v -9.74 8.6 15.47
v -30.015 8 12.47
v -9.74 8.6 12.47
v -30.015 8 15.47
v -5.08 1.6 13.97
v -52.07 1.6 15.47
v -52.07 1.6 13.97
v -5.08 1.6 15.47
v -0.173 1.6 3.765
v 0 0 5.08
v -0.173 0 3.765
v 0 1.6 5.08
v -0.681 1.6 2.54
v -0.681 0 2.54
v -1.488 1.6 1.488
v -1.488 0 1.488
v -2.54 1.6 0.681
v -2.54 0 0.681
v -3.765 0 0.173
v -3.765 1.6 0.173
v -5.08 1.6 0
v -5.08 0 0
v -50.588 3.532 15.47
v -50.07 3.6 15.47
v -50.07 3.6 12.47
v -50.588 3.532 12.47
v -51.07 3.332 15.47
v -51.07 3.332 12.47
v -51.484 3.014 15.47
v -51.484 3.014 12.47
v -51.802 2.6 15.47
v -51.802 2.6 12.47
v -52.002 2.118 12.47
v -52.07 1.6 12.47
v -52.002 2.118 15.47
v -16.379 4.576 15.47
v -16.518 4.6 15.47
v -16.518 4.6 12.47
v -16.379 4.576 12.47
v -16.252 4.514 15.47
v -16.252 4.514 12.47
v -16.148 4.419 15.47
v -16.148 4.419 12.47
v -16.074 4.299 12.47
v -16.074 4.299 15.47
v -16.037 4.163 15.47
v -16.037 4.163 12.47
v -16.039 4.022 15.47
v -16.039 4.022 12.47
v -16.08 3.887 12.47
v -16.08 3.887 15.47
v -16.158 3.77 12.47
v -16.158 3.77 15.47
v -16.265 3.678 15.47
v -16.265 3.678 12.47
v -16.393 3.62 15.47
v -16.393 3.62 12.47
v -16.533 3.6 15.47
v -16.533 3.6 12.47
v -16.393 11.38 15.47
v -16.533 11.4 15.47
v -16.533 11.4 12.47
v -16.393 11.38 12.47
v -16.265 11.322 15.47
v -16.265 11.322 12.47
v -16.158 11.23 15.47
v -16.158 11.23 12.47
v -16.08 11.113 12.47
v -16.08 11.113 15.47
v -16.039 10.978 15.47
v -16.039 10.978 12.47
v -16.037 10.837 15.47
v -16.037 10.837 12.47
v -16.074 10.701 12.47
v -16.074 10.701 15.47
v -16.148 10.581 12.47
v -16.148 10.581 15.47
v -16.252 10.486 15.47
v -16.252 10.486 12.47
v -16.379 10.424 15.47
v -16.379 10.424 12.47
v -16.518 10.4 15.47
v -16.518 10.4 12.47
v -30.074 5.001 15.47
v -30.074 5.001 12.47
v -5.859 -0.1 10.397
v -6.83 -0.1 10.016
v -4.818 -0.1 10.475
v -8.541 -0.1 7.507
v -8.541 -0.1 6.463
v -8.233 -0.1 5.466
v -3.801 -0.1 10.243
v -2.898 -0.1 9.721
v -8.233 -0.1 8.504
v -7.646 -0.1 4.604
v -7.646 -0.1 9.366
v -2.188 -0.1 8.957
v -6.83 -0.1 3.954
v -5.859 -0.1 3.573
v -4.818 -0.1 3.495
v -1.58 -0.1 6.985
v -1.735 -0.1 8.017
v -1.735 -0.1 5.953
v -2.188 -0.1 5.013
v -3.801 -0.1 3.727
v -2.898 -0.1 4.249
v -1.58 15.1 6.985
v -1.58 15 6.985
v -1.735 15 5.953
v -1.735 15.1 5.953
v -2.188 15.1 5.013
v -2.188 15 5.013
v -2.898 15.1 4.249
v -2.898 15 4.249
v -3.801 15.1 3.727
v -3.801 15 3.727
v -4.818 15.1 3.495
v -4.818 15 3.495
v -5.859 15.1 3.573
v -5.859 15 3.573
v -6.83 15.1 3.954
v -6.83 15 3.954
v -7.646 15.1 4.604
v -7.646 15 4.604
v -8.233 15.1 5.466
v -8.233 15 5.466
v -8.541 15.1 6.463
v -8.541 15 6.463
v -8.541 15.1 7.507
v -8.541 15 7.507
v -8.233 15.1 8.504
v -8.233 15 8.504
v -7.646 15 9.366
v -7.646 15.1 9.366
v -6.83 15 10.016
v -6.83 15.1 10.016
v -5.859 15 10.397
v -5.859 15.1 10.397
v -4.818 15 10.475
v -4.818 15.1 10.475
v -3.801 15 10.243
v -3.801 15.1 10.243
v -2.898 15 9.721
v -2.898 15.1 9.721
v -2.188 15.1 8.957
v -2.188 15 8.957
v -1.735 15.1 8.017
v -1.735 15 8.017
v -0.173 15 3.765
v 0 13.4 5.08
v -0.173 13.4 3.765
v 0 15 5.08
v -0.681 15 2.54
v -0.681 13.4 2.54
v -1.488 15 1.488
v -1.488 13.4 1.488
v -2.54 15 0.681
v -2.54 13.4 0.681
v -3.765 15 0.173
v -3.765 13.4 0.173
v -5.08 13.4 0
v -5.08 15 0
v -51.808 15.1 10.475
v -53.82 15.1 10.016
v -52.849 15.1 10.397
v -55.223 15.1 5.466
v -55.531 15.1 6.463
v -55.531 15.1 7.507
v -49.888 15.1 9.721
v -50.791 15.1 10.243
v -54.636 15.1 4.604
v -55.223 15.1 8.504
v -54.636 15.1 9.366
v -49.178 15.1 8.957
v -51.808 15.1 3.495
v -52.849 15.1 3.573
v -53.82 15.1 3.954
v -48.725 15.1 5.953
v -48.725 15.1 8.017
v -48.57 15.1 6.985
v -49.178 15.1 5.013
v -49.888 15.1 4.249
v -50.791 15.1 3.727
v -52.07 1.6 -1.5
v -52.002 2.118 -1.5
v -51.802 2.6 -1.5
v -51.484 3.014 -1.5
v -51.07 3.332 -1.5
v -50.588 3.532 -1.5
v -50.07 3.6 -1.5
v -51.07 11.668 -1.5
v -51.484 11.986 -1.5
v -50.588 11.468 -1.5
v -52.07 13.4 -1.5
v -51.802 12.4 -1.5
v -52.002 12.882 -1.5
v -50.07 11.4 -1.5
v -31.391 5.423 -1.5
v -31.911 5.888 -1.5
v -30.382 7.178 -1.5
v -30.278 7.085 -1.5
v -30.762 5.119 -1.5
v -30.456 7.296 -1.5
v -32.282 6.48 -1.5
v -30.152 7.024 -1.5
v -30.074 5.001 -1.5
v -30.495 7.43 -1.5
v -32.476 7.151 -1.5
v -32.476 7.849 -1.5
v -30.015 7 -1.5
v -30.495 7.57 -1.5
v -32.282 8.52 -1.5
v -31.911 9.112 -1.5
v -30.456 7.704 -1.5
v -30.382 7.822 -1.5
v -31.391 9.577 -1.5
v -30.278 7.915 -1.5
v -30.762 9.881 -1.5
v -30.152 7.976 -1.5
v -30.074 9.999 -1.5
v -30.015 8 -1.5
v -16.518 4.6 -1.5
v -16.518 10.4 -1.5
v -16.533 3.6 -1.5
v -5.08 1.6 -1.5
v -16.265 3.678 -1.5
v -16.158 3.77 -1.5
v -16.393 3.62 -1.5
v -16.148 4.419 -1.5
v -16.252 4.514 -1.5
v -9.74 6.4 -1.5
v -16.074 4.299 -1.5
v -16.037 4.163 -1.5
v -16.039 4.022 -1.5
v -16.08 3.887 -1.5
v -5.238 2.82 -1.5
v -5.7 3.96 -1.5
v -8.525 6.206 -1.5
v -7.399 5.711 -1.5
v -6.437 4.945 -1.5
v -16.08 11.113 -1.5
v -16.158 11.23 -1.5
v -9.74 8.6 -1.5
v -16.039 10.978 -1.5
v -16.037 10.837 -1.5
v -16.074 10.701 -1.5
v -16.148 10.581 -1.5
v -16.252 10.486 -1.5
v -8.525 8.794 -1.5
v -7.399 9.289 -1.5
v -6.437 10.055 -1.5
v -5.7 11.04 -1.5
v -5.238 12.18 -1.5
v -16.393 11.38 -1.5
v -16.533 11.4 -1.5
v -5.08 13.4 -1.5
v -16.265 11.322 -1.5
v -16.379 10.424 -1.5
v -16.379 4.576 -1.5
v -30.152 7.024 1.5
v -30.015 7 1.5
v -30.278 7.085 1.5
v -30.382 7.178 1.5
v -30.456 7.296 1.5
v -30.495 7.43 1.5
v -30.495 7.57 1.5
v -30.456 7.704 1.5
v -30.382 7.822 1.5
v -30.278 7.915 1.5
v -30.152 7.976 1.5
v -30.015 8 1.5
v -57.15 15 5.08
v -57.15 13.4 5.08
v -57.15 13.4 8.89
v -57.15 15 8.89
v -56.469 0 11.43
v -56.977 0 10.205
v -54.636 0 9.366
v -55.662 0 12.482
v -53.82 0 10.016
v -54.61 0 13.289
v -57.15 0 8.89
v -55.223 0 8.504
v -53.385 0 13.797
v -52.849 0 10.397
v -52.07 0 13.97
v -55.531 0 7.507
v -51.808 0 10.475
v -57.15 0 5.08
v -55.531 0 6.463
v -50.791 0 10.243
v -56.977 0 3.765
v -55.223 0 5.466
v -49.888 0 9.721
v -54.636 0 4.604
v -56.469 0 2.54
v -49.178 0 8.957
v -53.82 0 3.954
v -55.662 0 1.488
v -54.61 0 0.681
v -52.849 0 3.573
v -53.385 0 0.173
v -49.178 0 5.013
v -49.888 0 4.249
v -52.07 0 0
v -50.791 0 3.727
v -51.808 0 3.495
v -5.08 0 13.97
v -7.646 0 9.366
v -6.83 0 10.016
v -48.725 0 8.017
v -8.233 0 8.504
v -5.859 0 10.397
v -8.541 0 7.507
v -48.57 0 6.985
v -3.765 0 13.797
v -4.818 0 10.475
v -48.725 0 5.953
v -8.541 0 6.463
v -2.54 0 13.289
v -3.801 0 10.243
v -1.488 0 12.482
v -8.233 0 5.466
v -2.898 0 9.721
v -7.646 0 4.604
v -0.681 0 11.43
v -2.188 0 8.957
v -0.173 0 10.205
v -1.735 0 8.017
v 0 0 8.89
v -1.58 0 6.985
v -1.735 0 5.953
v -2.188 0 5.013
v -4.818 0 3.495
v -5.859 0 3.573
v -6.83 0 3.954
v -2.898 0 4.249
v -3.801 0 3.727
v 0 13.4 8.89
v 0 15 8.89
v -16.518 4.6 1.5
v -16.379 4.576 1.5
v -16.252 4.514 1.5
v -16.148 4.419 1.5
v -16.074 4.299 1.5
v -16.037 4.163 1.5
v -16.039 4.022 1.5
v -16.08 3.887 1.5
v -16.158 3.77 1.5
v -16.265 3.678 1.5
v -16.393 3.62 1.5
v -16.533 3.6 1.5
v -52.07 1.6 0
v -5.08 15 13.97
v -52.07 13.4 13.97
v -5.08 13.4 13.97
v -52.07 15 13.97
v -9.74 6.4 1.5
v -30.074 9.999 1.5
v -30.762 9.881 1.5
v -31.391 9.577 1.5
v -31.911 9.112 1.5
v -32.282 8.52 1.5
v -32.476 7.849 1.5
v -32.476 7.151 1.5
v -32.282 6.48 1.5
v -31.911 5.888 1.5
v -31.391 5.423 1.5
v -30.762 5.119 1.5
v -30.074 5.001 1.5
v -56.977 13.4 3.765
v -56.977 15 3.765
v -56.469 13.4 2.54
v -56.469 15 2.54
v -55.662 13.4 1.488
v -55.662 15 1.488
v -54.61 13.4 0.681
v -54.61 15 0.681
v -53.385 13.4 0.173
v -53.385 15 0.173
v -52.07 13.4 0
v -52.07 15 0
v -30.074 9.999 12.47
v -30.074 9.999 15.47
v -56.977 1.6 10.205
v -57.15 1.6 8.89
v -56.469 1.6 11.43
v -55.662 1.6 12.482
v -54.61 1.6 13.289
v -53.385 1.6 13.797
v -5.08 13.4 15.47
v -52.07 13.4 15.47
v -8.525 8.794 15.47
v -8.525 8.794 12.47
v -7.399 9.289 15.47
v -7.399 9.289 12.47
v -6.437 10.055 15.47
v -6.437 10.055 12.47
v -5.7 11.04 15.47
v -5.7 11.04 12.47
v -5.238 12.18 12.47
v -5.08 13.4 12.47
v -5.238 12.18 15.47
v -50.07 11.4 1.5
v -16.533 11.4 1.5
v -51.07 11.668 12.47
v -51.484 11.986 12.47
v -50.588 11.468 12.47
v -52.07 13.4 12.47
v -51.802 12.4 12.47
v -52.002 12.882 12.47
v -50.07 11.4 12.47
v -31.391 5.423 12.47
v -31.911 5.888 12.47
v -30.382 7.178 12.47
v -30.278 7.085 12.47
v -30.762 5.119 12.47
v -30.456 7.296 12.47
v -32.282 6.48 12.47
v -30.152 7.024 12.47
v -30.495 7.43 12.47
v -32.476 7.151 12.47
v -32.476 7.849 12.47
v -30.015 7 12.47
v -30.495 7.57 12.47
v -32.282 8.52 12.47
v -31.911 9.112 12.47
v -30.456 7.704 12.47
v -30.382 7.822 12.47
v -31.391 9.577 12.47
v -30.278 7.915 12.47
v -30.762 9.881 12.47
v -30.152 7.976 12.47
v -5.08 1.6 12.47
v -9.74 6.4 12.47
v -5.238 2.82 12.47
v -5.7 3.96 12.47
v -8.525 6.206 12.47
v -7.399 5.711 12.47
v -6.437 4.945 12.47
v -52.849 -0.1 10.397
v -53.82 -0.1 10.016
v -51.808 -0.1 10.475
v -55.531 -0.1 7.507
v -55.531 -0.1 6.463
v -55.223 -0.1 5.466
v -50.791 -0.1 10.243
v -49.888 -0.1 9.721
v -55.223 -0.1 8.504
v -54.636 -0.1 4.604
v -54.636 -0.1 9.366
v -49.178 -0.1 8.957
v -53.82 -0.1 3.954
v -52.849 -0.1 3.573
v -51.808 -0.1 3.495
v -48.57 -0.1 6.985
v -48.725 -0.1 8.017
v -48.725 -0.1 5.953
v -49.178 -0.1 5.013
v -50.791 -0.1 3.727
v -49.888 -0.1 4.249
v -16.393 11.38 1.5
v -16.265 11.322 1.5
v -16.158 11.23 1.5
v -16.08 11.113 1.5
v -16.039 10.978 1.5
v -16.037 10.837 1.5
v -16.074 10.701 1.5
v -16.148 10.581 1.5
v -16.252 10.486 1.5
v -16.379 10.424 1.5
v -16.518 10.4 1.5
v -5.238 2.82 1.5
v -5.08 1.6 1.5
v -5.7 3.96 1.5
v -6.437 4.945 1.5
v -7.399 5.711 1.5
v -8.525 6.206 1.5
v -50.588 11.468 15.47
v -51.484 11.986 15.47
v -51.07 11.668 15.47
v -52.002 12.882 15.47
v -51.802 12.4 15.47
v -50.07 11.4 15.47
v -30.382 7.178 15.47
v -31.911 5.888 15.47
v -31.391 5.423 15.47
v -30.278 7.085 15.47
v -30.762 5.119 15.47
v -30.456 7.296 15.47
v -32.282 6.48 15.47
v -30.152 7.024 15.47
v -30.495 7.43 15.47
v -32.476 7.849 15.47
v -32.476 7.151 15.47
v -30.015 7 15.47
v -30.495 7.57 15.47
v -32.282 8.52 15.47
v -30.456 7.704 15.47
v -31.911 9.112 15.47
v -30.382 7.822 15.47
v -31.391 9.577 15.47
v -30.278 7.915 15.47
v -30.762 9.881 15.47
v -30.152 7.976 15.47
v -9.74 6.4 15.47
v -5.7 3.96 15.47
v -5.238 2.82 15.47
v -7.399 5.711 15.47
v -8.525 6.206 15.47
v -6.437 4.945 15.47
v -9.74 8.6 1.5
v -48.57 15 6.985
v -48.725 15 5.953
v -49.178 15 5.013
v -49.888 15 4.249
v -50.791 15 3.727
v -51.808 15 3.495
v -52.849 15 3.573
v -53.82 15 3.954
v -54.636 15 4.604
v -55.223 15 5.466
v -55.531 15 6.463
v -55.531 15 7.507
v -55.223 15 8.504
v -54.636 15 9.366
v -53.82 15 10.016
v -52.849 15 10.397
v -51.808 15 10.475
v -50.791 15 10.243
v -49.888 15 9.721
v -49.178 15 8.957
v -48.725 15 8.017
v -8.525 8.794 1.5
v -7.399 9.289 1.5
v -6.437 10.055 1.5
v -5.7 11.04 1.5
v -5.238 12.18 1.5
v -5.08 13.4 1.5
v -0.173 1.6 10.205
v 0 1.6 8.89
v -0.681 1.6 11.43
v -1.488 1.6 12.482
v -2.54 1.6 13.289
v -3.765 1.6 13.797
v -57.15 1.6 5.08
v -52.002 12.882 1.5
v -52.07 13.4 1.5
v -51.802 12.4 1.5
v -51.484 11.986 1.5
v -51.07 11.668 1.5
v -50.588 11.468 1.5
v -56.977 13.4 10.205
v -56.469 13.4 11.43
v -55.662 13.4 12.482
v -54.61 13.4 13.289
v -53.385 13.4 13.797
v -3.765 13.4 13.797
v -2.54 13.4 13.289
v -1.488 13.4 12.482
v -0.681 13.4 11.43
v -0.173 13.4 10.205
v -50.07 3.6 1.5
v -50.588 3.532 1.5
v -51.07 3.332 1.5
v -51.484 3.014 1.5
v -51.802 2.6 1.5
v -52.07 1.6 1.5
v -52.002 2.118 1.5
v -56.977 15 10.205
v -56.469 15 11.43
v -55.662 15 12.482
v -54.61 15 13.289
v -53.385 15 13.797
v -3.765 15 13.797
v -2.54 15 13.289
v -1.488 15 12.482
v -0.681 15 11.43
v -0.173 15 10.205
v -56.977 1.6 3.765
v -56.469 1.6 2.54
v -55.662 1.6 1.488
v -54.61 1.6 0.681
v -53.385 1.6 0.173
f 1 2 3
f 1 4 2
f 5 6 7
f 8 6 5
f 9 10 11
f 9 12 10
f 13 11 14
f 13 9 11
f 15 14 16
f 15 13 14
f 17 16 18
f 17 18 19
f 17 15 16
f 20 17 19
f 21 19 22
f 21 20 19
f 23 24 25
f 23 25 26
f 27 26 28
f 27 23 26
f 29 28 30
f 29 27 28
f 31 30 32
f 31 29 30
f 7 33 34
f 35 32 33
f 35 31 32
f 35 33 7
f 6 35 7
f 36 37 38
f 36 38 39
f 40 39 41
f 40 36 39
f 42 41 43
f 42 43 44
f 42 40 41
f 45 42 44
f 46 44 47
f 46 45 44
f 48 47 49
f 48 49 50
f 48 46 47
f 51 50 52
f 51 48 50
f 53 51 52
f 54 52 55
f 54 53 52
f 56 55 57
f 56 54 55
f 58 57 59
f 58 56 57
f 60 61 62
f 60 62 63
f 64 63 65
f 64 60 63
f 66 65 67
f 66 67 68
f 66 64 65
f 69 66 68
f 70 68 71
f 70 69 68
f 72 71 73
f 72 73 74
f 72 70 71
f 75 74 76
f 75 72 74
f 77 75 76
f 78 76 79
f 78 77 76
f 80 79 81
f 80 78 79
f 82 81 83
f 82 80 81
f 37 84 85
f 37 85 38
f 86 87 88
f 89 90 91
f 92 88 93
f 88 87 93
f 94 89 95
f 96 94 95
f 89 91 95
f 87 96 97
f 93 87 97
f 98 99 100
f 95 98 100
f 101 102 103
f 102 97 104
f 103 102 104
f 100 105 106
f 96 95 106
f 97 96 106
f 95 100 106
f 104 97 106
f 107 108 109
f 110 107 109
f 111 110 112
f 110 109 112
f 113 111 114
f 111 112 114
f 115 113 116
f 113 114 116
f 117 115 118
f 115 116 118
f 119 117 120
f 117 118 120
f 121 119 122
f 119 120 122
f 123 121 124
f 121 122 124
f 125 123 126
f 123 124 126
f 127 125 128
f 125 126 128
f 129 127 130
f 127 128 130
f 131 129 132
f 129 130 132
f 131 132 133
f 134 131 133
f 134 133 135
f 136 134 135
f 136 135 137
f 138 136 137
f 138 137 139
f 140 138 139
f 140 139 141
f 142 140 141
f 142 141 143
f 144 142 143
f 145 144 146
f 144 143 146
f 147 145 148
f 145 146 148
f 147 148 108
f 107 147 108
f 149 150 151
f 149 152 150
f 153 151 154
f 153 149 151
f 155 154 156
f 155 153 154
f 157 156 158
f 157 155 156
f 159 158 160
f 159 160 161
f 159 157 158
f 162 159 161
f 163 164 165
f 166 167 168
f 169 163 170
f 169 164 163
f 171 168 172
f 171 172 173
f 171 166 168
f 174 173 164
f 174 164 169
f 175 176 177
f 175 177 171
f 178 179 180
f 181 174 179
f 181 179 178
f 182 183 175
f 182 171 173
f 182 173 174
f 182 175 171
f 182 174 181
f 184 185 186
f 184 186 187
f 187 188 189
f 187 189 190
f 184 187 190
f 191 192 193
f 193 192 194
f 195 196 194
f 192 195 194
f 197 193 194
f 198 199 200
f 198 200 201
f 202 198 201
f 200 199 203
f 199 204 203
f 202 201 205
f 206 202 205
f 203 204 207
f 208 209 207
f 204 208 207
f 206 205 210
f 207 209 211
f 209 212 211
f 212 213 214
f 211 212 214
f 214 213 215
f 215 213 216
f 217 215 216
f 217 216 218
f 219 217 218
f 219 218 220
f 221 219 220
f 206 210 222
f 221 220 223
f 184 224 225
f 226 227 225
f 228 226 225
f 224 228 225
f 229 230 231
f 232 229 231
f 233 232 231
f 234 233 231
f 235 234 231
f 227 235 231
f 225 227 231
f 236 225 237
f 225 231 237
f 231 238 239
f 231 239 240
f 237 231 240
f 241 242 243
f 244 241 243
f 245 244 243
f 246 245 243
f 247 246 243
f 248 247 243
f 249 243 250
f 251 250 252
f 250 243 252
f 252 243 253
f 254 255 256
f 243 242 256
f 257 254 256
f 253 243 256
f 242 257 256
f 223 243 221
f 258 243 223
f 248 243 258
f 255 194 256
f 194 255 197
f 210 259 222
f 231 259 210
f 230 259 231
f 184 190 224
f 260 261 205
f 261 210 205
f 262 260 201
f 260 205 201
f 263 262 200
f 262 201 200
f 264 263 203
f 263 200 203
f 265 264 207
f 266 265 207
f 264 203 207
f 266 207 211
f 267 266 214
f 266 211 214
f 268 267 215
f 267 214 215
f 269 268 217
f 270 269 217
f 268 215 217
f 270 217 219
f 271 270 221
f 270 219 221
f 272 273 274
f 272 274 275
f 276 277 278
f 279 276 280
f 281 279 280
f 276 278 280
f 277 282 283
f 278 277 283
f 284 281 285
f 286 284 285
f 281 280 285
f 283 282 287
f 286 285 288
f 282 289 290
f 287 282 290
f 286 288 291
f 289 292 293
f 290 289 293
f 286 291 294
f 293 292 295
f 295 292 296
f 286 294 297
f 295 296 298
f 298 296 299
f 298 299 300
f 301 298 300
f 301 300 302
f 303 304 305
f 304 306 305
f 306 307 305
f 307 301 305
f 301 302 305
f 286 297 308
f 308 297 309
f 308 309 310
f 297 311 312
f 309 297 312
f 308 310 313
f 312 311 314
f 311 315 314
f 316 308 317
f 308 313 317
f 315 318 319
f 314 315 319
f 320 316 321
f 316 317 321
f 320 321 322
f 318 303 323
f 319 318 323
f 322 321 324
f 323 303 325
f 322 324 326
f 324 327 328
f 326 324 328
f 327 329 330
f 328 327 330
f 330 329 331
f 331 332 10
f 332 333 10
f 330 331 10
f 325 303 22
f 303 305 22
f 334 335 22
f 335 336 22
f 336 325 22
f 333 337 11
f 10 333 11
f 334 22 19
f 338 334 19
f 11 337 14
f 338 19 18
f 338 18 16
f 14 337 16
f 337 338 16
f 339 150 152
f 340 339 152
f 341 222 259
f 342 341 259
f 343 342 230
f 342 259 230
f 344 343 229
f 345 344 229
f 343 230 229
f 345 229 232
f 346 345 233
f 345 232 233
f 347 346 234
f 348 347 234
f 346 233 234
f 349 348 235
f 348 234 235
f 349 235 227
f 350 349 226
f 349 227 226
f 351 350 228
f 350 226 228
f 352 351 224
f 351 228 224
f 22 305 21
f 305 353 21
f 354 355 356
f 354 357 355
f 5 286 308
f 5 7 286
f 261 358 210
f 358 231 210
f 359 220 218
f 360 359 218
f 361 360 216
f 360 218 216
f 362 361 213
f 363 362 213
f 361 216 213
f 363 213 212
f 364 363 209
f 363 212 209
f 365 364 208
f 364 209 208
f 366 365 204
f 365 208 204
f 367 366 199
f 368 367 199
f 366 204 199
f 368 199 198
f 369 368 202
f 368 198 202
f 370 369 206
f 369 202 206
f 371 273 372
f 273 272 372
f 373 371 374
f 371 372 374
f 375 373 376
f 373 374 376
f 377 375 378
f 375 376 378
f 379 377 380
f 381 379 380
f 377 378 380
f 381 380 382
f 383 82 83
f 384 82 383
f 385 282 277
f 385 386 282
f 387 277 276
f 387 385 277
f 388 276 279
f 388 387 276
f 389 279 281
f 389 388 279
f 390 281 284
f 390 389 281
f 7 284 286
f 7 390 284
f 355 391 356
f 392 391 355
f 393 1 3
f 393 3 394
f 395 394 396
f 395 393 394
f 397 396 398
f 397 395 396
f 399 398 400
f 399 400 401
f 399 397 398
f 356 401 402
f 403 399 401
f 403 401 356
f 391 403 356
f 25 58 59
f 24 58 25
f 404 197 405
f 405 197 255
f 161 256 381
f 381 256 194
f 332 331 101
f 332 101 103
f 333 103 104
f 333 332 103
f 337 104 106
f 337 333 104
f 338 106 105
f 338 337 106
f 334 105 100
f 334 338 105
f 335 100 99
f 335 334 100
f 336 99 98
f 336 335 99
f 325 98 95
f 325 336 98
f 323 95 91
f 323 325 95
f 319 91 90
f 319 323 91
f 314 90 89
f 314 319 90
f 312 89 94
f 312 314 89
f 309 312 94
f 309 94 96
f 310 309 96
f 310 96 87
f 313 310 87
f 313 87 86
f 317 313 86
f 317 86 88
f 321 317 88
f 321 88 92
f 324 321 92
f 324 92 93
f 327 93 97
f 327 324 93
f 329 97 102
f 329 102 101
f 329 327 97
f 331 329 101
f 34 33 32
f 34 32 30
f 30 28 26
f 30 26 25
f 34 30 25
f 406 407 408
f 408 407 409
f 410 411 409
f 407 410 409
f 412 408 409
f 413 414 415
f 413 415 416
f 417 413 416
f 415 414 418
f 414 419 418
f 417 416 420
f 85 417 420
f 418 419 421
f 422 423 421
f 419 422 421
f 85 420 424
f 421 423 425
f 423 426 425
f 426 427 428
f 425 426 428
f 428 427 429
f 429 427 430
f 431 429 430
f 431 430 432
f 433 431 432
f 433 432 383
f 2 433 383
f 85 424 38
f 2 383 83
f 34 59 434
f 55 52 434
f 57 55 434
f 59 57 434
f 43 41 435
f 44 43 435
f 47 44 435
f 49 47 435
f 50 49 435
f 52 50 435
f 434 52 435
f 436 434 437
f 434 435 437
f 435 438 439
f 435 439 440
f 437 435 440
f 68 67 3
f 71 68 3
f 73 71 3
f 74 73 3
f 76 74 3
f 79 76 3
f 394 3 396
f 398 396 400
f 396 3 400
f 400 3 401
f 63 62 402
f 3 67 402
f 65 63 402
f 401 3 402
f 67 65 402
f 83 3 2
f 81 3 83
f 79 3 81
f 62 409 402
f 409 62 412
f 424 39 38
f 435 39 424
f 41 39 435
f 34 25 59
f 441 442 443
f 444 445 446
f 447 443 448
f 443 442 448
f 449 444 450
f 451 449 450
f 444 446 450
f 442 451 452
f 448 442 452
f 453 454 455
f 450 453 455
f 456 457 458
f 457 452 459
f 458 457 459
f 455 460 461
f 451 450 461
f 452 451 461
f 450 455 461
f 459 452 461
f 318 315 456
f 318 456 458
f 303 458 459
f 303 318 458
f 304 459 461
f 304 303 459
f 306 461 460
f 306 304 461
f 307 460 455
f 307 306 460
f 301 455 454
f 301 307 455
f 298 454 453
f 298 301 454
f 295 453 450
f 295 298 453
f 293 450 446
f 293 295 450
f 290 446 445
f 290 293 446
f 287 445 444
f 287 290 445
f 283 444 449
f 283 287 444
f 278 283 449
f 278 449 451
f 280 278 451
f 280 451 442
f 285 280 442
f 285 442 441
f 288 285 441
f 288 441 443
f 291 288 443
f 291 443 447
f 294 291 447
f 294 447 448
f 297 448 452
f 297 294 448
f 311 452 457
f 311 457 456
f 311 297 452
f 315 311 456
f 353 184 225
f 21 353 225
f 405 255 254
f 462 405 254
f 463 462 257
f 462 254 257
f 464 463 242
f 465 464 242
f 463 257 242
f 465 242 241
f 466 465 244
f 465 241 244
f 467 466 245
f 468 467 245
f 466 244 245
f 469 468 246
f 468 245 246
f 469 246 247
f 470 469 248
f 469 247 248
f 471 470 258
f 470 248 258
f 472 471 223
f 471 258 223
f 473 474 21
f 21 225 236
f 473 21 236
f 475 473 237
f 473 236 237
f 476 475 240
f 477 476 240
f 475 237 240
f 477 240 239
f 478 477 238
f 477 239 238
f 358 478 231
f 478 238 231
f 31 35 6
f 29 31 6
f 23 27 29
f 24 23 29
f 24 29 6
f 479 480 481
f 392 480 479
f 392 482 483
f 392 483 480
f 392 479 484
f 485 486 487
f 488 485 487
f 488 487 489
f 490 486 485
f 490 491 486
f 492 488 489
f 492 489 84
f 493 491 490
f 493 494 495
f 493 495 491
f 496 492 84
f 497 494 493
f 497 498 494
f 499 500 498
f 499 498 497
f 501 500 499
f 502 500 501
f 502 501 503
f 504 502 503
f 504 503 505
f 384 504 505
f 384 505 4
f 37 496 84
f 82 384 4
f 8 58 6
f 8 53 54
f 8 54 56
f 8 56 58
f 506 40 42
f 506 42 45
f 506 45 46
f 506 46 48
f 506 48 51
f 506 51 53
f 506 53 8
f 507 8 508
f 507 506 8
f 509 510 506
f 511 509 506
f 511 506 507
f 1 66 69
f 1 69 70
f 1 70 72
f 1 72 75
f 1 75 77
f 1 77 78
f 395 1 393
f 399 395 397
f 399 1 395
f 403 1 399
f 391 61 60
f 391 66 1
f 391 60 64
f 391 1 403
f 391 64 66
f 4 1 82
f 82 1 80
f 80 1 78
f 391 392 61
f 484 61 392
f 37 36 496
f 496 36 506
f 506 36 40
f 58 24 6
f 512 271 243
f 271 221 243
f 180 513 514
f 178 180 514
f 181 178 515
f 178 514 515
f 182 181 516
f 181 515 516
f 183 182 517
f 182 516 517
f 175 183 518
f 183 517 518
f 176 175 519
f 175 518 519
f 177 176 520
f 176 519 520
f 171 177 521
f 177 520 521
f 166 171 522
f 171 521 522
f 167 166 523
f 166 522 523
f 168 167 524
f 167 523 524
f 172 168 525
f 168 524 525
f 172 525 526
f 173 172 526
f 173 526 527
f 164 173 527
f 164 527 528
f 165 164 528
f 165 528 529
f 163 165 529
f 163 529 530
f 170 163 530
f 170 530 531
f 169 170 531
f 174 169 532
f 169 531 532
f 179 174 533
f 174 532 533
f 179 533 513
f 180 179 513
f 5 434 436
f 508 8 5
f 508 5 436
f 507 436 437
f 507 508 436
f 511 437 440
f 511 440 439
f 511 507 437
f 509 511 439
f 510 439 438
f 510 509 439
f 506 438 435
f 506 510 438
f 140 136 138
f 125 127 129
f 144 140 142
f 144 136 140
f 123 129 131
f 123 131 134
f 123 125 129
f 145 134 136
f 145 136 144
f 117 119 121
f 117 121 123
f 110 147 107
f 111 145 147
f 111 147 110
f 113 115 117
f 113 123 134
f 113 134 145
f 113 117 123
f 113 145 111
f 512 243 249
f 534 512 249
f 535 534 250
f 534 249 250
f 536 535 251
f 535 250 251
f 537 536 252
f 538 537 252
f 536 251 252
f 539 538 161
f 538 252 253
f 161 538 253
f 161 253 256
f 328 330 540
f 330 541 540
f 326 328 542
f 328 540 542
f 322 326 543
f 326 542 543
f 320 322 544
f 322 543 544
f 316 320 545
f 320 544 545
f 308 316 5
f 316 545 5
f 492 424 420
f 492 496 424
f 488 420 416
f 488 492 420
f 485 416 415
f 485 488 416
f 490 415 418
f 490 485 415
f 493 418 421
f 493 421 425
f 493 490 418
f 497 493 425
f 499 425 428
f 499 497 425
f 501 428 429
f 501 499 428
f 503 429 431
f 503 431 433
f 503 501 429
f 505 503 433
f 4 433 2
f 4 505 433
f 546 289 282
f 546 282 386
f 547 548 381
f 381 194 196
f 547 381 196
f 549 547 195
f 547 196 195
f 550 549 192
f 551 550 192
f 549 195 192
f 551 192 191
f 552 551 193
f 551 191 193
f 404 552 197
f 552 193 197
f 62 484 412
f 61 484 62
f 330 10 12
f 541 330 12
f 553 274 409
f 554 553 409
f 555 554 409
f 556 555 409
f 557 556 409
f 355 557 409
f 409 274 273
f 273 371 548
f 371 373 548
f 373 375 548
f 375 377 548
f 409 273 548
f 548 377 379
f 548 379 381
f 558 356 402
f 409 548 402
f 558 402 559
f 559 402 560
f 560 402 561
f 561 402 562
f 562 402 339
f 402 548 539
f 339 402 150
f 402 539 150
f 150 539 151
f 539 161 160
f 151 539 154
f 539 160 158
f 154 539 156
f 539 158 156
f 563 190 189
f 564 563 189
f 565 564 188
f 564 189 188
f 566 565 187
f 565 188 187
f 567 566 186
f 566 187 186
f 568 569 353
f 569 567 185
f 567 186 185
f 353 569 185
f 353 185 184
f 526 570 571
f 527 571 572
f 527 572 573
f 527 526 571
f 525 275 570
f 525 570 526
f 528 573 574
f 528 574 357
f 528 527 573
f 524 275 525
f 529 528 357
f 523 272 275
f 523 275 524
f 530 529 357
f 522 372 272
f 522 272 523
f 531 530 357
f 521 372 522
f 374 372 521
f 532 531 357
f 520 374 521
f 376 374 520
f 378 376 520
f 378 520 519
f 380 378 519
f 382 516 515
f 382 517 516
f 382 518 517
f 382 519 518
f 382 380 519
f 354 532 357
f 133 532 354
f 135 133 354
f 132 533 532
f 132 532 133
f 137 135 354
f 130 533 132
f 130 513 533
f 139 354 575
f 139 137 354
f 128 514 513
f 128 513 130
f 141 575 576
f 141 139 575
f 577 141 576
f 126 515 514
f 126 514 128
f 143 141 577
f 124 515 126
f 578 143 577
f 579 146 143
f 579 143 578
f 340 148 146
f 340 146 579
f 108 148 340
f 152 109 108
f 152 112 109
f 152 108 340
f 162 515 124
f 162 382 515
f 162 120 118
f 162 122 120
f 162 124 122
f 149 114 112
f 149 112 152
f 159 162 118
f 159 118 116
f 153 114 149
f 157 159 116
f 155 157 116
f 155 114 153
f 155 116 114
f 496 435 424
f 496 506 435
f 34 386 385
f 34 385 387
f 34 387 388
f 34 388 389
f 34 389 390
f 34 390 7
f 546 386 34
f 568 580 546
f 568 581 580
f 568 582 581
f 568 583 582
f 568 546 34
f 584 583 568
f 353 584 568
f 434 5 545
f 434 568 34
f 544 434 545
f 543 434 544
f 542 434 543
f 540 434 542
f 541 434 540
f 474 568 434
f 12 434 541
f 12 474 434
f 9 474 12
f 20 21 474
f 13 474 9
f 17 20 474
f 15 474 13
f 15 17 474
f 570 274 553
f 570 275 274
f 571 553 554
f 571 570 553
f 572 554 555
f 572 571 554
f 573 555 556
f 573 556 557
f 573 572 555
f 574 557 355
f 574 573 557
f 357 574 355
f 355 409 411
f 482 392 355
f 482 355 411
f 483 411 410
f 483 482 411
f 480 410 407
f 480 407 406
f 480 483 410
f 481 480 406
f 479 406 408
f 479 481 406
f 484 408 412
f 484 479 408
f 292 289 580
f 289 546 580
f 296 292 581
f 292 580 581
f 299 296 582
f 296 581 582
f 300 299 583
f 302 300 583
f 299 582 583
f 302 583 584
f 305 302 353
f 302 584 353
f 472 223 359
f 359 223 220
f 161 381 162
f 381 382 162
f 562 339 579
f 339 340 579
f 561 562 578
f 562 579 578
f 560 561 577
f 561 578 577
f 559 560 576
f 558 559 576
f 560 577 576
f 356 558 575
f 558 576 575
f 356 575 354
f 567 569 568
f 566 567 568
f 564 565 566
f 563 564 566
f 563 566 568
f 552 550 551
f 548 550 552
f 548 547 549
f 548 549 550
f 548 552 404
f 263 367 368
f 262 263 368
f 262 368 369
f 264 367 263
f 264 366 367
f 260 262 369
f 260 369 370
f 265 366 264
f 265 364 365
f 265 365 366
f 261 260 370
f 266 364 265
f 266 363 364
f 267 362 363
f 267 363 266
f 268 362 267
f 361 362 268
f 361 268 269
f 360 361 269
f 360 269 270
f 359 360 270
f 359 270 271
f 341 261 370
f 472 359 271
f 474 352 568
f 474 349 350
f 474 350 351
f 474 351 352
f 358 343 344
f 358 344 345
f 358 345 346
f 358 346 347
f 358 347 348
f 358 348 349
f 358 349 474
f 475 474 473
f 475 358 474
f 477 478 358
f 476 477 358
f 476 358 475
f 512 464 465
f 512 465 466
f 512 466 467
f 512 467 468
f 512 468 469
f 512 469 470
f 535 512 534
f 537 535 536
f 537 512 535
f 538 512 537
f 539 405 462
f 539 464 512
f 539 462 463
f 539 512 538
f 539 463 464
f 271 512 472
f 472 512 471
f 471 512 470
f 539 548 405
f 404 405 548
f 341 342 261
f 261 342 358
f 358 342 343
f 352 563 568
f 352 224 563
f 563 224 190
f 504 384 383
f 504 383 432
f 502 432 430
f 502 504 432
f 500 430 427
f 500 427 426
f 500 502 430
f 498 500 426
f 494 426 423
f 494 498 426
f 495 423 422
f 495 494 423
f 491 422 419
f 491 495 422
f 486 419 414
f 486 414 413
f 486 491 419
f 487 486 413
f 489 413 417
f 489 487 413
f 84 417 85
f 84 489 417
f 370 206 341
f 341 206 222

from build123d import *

# Parameters (mm, degrees)
SKETCH1_W             = 57.15
SKETCH1_H             = 1.6
BOSS_EXTRUDE1_DEPTH   = 13.97
BOSS_EXTRUDE1_2_DEPTH = 13.97
FILLET1_R             = 5.08
FILLET2_R             = 5.08
BOSS_EXTRUDE3_DEPTH   = 1.5
SKETCH3_R             = 3.5
BOSS_EXTRUDE4_DEPTH   = 0.1


with BuildPart() as part:
    # Sketch1 → Boss-Extrude1 (new body)
    with BuildSketch(Plane.XY):
        with Locations((-28.575, 0.8)):
            Rectangle(SKETCH1_W, SKETCH1_H)
    extrude(amount=BOSS_EXTRUDE1_DEPTH)

    # Fillet2
    fillet2_edges = [part.edges().sort_by_distance(p)[0] for p in [
        (-57.15, 0.8, 13.97),
        (0, 0.8, 13.97),
        (-57.15, 0.8, 0),
        (0, 0.8, 0),
    ]]
    fillet(fillet2_edges, radius=FILLET2_R)



with BuildPart() as body_2:
    # Sketch1 → Boss-Extrude1 2 (new body)
    with BuildSketch(Plane.XY):
        with Locations((-28.575, 14.2)):
            Rectangle(SKETCH1_W, SKETCH1_H)
    extrude(amount=BOSS_EXTRUDE1_2_DEPTH)

    # Fillet1
    fillet1_edges = [body_2.edges().sort_by_distance(p)[0] for p in [
        (-57.15, 14.2, 13.97),
        (0, 14.2, 13.97),
        (-57.15, 14.2, 0),
        (0, 14.2, 0),
    ]]
    fillet(fillet1_edges, radius=FILLET1_R)


with BuildPart() as part_1:
    add(part.part)

    add(body_2.part)  # Boss-Extrude3 merges body 2
    # Sketch2 → Boss-Extrude3 (add, symmetric)
    with BuildSketch(Plane.XY.offset(13.97)):
        with BuildLine():
            Line((-30.014795616, 7.999781042), (-9.740002775, 8.6))
            ThreePointArc((-9.740002775, 8.6), (-6.43662966, 10.055017718), (-5.08, 13.4))
            Line((-5.08, 13.4), (-52.07, 13.4))
            ThreePointArc((-52.07, 13.4), (-51.484213562, 11.985786438), (-50.07, 11.4))
            Line((-50.07, 11.4), (-16.532798801, 11.4))
            ThreePointArc((-16.532798801, 11.4), (-16.032853544, 10.907398618), (-16.518003185, 10.400218958))
            Line((-16.518003185, 10.400218958), (-30.073978082, 9.998905209))
            ThreePointArc((-30.073978082, 9.998905209), (-32.5, 7.5), (-30.073978082, 5.001094791))
            Line((-30.073978082, 5.001094791), (-16.518003185, 4.599781042))
            ThreePointArc((-16.518003185, 4.599781042), (-16.032853544, 4.092601382), (-16.532798801, 3.6))
            Line((-16.532798801, 3.6), (-50.07, 3.6))
            ThreePointArc((-50.07, 3.6), (-51.484213562, 3.014213562), (-52.07, 1.6))
            Line((-52.07, 1.6), (-5.08, 1.6))
            ThreePointArc((-5.08, 1.6), (-6.43662966, 4.944982282), (-9.740002775, 6.4))
            Line((-9.740002775, 6.4), (-30.014795616, 7.000218958))
            ThreePointArc((-30.014795616, 7.000218958), (-30.5, 7.5), (-30.014795616, 7.999781042))
        make_face()
    boss_extrude3 = extrude(amount=BOSS_EXTRUDE3_DEPTH, both=True)

    # Mirror2: Boss-Extrude3 across plane
    add(boss_extrude3.mirror(Plane(origin=(0, 0, 6.985), x_dir=(1, 0, 0), z_dir=(0, 0, -1))))

    # Sketch3 → Boss-Extrude4 (add)
    with BuildSketch(Plane(origin=(0, 15, 0), x_dir=(1, 0, 0), z_dir=(0, 1, 0))):
        with Locations((-5.08, -6.985)):
            Circle(SKETCH3_R)
        with Locations((-52.07, -6.985)):
            Circle(SKETCH3_R)
    boss_extrude4 = extrude(amount=BOSS_EXTRUDE4_DEPTH)

    # Mirror3: Boss-Extrude4 across plane
    add(boss_extrude4.mirror(Plane.ZX.offset(7.5)))


solid = part_1.part
